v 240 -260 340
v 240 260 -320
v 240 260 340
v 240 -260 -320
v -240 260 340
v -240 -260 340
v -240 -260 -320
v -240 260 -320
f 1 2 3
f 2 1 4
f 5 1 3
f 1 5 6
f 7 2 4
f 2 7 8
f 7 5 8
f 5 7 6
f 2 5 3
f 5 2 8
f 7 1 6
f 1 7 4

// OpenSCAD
// ============================================================================
// Atom Lithography Machine — Parametric OpenSCAD Module (S6.1-02)
// ============================================================================
// part_id           : S6.1-02
// parent_bom_id     : S6.1
// subsystem         : S6
// part_name         : Uzak doner valf, su sogutmali He kompresoru ve esnek hatlar
// material          : Steel
// temp_stage        : 300 K (tesis)
// vacuum_grade      : 20 bar He
// tolerance         : He 99.999%
// computed_mass_kg  : 150.17445
// envelope_mm       : 480.000 x 520.000 x 680.000
// design_maturity   : M0_M1_DETAILED_CAD_DESIGN_ONLY
// no_lab_measurement: true
// iec61508_certified: false
// semi_s2_certified : false
// Units: millimeters (mm)
// ============================================================================

$fn = 64;

// Nominal bounding envelope parameters (mm)
bbox_x = 480.0000;
bbox_y = 520.0000;
bbox_z = 680.0000;

// Part-specific parametric dimensions
cpa_w = 480.0;
cpa_d = 520.0;
cpa_h = 680.0;
he_pressure_bar = 20.0;

// Interface / port parameters (mm)
port_he_supply_od = 28.000;
port_he_supply_bore = 16.000;
port_he_return_od = 28.000;
port_he_return_bore = 16.000;
port_chilled_water_in_od = 28.000;
port_chilled_water_in_bore = 12.700;
port_chilled_water_out_od = 28.000;
port_chilled_water_out_bore = 12.700;

module part_S6_1_02() {
  union() {
    // CPA water-cooled He compressor cabinet
    translate([0.000, 0.000, 10.000]) cube([480.000, 520.000, 660.000], center=true);
    // He HP supply coupling
    translate([-120.000, 0.000, 334.000]) cylinder(d=28.000, h=12.000, center=true);
    // He LP return coupling
    translate([-60.000, 0.000, 334.000]) cylinder(d=28.000, h=12.000, center=true);
  }
}

// World assembly mounting transform (global machine frame, mm / deg):
// translate([-1950.000, -800.000, 340.000]) rotate([0.000, 0.000, 0.000]) part_S6_1_02();

part_S6_1_02();
